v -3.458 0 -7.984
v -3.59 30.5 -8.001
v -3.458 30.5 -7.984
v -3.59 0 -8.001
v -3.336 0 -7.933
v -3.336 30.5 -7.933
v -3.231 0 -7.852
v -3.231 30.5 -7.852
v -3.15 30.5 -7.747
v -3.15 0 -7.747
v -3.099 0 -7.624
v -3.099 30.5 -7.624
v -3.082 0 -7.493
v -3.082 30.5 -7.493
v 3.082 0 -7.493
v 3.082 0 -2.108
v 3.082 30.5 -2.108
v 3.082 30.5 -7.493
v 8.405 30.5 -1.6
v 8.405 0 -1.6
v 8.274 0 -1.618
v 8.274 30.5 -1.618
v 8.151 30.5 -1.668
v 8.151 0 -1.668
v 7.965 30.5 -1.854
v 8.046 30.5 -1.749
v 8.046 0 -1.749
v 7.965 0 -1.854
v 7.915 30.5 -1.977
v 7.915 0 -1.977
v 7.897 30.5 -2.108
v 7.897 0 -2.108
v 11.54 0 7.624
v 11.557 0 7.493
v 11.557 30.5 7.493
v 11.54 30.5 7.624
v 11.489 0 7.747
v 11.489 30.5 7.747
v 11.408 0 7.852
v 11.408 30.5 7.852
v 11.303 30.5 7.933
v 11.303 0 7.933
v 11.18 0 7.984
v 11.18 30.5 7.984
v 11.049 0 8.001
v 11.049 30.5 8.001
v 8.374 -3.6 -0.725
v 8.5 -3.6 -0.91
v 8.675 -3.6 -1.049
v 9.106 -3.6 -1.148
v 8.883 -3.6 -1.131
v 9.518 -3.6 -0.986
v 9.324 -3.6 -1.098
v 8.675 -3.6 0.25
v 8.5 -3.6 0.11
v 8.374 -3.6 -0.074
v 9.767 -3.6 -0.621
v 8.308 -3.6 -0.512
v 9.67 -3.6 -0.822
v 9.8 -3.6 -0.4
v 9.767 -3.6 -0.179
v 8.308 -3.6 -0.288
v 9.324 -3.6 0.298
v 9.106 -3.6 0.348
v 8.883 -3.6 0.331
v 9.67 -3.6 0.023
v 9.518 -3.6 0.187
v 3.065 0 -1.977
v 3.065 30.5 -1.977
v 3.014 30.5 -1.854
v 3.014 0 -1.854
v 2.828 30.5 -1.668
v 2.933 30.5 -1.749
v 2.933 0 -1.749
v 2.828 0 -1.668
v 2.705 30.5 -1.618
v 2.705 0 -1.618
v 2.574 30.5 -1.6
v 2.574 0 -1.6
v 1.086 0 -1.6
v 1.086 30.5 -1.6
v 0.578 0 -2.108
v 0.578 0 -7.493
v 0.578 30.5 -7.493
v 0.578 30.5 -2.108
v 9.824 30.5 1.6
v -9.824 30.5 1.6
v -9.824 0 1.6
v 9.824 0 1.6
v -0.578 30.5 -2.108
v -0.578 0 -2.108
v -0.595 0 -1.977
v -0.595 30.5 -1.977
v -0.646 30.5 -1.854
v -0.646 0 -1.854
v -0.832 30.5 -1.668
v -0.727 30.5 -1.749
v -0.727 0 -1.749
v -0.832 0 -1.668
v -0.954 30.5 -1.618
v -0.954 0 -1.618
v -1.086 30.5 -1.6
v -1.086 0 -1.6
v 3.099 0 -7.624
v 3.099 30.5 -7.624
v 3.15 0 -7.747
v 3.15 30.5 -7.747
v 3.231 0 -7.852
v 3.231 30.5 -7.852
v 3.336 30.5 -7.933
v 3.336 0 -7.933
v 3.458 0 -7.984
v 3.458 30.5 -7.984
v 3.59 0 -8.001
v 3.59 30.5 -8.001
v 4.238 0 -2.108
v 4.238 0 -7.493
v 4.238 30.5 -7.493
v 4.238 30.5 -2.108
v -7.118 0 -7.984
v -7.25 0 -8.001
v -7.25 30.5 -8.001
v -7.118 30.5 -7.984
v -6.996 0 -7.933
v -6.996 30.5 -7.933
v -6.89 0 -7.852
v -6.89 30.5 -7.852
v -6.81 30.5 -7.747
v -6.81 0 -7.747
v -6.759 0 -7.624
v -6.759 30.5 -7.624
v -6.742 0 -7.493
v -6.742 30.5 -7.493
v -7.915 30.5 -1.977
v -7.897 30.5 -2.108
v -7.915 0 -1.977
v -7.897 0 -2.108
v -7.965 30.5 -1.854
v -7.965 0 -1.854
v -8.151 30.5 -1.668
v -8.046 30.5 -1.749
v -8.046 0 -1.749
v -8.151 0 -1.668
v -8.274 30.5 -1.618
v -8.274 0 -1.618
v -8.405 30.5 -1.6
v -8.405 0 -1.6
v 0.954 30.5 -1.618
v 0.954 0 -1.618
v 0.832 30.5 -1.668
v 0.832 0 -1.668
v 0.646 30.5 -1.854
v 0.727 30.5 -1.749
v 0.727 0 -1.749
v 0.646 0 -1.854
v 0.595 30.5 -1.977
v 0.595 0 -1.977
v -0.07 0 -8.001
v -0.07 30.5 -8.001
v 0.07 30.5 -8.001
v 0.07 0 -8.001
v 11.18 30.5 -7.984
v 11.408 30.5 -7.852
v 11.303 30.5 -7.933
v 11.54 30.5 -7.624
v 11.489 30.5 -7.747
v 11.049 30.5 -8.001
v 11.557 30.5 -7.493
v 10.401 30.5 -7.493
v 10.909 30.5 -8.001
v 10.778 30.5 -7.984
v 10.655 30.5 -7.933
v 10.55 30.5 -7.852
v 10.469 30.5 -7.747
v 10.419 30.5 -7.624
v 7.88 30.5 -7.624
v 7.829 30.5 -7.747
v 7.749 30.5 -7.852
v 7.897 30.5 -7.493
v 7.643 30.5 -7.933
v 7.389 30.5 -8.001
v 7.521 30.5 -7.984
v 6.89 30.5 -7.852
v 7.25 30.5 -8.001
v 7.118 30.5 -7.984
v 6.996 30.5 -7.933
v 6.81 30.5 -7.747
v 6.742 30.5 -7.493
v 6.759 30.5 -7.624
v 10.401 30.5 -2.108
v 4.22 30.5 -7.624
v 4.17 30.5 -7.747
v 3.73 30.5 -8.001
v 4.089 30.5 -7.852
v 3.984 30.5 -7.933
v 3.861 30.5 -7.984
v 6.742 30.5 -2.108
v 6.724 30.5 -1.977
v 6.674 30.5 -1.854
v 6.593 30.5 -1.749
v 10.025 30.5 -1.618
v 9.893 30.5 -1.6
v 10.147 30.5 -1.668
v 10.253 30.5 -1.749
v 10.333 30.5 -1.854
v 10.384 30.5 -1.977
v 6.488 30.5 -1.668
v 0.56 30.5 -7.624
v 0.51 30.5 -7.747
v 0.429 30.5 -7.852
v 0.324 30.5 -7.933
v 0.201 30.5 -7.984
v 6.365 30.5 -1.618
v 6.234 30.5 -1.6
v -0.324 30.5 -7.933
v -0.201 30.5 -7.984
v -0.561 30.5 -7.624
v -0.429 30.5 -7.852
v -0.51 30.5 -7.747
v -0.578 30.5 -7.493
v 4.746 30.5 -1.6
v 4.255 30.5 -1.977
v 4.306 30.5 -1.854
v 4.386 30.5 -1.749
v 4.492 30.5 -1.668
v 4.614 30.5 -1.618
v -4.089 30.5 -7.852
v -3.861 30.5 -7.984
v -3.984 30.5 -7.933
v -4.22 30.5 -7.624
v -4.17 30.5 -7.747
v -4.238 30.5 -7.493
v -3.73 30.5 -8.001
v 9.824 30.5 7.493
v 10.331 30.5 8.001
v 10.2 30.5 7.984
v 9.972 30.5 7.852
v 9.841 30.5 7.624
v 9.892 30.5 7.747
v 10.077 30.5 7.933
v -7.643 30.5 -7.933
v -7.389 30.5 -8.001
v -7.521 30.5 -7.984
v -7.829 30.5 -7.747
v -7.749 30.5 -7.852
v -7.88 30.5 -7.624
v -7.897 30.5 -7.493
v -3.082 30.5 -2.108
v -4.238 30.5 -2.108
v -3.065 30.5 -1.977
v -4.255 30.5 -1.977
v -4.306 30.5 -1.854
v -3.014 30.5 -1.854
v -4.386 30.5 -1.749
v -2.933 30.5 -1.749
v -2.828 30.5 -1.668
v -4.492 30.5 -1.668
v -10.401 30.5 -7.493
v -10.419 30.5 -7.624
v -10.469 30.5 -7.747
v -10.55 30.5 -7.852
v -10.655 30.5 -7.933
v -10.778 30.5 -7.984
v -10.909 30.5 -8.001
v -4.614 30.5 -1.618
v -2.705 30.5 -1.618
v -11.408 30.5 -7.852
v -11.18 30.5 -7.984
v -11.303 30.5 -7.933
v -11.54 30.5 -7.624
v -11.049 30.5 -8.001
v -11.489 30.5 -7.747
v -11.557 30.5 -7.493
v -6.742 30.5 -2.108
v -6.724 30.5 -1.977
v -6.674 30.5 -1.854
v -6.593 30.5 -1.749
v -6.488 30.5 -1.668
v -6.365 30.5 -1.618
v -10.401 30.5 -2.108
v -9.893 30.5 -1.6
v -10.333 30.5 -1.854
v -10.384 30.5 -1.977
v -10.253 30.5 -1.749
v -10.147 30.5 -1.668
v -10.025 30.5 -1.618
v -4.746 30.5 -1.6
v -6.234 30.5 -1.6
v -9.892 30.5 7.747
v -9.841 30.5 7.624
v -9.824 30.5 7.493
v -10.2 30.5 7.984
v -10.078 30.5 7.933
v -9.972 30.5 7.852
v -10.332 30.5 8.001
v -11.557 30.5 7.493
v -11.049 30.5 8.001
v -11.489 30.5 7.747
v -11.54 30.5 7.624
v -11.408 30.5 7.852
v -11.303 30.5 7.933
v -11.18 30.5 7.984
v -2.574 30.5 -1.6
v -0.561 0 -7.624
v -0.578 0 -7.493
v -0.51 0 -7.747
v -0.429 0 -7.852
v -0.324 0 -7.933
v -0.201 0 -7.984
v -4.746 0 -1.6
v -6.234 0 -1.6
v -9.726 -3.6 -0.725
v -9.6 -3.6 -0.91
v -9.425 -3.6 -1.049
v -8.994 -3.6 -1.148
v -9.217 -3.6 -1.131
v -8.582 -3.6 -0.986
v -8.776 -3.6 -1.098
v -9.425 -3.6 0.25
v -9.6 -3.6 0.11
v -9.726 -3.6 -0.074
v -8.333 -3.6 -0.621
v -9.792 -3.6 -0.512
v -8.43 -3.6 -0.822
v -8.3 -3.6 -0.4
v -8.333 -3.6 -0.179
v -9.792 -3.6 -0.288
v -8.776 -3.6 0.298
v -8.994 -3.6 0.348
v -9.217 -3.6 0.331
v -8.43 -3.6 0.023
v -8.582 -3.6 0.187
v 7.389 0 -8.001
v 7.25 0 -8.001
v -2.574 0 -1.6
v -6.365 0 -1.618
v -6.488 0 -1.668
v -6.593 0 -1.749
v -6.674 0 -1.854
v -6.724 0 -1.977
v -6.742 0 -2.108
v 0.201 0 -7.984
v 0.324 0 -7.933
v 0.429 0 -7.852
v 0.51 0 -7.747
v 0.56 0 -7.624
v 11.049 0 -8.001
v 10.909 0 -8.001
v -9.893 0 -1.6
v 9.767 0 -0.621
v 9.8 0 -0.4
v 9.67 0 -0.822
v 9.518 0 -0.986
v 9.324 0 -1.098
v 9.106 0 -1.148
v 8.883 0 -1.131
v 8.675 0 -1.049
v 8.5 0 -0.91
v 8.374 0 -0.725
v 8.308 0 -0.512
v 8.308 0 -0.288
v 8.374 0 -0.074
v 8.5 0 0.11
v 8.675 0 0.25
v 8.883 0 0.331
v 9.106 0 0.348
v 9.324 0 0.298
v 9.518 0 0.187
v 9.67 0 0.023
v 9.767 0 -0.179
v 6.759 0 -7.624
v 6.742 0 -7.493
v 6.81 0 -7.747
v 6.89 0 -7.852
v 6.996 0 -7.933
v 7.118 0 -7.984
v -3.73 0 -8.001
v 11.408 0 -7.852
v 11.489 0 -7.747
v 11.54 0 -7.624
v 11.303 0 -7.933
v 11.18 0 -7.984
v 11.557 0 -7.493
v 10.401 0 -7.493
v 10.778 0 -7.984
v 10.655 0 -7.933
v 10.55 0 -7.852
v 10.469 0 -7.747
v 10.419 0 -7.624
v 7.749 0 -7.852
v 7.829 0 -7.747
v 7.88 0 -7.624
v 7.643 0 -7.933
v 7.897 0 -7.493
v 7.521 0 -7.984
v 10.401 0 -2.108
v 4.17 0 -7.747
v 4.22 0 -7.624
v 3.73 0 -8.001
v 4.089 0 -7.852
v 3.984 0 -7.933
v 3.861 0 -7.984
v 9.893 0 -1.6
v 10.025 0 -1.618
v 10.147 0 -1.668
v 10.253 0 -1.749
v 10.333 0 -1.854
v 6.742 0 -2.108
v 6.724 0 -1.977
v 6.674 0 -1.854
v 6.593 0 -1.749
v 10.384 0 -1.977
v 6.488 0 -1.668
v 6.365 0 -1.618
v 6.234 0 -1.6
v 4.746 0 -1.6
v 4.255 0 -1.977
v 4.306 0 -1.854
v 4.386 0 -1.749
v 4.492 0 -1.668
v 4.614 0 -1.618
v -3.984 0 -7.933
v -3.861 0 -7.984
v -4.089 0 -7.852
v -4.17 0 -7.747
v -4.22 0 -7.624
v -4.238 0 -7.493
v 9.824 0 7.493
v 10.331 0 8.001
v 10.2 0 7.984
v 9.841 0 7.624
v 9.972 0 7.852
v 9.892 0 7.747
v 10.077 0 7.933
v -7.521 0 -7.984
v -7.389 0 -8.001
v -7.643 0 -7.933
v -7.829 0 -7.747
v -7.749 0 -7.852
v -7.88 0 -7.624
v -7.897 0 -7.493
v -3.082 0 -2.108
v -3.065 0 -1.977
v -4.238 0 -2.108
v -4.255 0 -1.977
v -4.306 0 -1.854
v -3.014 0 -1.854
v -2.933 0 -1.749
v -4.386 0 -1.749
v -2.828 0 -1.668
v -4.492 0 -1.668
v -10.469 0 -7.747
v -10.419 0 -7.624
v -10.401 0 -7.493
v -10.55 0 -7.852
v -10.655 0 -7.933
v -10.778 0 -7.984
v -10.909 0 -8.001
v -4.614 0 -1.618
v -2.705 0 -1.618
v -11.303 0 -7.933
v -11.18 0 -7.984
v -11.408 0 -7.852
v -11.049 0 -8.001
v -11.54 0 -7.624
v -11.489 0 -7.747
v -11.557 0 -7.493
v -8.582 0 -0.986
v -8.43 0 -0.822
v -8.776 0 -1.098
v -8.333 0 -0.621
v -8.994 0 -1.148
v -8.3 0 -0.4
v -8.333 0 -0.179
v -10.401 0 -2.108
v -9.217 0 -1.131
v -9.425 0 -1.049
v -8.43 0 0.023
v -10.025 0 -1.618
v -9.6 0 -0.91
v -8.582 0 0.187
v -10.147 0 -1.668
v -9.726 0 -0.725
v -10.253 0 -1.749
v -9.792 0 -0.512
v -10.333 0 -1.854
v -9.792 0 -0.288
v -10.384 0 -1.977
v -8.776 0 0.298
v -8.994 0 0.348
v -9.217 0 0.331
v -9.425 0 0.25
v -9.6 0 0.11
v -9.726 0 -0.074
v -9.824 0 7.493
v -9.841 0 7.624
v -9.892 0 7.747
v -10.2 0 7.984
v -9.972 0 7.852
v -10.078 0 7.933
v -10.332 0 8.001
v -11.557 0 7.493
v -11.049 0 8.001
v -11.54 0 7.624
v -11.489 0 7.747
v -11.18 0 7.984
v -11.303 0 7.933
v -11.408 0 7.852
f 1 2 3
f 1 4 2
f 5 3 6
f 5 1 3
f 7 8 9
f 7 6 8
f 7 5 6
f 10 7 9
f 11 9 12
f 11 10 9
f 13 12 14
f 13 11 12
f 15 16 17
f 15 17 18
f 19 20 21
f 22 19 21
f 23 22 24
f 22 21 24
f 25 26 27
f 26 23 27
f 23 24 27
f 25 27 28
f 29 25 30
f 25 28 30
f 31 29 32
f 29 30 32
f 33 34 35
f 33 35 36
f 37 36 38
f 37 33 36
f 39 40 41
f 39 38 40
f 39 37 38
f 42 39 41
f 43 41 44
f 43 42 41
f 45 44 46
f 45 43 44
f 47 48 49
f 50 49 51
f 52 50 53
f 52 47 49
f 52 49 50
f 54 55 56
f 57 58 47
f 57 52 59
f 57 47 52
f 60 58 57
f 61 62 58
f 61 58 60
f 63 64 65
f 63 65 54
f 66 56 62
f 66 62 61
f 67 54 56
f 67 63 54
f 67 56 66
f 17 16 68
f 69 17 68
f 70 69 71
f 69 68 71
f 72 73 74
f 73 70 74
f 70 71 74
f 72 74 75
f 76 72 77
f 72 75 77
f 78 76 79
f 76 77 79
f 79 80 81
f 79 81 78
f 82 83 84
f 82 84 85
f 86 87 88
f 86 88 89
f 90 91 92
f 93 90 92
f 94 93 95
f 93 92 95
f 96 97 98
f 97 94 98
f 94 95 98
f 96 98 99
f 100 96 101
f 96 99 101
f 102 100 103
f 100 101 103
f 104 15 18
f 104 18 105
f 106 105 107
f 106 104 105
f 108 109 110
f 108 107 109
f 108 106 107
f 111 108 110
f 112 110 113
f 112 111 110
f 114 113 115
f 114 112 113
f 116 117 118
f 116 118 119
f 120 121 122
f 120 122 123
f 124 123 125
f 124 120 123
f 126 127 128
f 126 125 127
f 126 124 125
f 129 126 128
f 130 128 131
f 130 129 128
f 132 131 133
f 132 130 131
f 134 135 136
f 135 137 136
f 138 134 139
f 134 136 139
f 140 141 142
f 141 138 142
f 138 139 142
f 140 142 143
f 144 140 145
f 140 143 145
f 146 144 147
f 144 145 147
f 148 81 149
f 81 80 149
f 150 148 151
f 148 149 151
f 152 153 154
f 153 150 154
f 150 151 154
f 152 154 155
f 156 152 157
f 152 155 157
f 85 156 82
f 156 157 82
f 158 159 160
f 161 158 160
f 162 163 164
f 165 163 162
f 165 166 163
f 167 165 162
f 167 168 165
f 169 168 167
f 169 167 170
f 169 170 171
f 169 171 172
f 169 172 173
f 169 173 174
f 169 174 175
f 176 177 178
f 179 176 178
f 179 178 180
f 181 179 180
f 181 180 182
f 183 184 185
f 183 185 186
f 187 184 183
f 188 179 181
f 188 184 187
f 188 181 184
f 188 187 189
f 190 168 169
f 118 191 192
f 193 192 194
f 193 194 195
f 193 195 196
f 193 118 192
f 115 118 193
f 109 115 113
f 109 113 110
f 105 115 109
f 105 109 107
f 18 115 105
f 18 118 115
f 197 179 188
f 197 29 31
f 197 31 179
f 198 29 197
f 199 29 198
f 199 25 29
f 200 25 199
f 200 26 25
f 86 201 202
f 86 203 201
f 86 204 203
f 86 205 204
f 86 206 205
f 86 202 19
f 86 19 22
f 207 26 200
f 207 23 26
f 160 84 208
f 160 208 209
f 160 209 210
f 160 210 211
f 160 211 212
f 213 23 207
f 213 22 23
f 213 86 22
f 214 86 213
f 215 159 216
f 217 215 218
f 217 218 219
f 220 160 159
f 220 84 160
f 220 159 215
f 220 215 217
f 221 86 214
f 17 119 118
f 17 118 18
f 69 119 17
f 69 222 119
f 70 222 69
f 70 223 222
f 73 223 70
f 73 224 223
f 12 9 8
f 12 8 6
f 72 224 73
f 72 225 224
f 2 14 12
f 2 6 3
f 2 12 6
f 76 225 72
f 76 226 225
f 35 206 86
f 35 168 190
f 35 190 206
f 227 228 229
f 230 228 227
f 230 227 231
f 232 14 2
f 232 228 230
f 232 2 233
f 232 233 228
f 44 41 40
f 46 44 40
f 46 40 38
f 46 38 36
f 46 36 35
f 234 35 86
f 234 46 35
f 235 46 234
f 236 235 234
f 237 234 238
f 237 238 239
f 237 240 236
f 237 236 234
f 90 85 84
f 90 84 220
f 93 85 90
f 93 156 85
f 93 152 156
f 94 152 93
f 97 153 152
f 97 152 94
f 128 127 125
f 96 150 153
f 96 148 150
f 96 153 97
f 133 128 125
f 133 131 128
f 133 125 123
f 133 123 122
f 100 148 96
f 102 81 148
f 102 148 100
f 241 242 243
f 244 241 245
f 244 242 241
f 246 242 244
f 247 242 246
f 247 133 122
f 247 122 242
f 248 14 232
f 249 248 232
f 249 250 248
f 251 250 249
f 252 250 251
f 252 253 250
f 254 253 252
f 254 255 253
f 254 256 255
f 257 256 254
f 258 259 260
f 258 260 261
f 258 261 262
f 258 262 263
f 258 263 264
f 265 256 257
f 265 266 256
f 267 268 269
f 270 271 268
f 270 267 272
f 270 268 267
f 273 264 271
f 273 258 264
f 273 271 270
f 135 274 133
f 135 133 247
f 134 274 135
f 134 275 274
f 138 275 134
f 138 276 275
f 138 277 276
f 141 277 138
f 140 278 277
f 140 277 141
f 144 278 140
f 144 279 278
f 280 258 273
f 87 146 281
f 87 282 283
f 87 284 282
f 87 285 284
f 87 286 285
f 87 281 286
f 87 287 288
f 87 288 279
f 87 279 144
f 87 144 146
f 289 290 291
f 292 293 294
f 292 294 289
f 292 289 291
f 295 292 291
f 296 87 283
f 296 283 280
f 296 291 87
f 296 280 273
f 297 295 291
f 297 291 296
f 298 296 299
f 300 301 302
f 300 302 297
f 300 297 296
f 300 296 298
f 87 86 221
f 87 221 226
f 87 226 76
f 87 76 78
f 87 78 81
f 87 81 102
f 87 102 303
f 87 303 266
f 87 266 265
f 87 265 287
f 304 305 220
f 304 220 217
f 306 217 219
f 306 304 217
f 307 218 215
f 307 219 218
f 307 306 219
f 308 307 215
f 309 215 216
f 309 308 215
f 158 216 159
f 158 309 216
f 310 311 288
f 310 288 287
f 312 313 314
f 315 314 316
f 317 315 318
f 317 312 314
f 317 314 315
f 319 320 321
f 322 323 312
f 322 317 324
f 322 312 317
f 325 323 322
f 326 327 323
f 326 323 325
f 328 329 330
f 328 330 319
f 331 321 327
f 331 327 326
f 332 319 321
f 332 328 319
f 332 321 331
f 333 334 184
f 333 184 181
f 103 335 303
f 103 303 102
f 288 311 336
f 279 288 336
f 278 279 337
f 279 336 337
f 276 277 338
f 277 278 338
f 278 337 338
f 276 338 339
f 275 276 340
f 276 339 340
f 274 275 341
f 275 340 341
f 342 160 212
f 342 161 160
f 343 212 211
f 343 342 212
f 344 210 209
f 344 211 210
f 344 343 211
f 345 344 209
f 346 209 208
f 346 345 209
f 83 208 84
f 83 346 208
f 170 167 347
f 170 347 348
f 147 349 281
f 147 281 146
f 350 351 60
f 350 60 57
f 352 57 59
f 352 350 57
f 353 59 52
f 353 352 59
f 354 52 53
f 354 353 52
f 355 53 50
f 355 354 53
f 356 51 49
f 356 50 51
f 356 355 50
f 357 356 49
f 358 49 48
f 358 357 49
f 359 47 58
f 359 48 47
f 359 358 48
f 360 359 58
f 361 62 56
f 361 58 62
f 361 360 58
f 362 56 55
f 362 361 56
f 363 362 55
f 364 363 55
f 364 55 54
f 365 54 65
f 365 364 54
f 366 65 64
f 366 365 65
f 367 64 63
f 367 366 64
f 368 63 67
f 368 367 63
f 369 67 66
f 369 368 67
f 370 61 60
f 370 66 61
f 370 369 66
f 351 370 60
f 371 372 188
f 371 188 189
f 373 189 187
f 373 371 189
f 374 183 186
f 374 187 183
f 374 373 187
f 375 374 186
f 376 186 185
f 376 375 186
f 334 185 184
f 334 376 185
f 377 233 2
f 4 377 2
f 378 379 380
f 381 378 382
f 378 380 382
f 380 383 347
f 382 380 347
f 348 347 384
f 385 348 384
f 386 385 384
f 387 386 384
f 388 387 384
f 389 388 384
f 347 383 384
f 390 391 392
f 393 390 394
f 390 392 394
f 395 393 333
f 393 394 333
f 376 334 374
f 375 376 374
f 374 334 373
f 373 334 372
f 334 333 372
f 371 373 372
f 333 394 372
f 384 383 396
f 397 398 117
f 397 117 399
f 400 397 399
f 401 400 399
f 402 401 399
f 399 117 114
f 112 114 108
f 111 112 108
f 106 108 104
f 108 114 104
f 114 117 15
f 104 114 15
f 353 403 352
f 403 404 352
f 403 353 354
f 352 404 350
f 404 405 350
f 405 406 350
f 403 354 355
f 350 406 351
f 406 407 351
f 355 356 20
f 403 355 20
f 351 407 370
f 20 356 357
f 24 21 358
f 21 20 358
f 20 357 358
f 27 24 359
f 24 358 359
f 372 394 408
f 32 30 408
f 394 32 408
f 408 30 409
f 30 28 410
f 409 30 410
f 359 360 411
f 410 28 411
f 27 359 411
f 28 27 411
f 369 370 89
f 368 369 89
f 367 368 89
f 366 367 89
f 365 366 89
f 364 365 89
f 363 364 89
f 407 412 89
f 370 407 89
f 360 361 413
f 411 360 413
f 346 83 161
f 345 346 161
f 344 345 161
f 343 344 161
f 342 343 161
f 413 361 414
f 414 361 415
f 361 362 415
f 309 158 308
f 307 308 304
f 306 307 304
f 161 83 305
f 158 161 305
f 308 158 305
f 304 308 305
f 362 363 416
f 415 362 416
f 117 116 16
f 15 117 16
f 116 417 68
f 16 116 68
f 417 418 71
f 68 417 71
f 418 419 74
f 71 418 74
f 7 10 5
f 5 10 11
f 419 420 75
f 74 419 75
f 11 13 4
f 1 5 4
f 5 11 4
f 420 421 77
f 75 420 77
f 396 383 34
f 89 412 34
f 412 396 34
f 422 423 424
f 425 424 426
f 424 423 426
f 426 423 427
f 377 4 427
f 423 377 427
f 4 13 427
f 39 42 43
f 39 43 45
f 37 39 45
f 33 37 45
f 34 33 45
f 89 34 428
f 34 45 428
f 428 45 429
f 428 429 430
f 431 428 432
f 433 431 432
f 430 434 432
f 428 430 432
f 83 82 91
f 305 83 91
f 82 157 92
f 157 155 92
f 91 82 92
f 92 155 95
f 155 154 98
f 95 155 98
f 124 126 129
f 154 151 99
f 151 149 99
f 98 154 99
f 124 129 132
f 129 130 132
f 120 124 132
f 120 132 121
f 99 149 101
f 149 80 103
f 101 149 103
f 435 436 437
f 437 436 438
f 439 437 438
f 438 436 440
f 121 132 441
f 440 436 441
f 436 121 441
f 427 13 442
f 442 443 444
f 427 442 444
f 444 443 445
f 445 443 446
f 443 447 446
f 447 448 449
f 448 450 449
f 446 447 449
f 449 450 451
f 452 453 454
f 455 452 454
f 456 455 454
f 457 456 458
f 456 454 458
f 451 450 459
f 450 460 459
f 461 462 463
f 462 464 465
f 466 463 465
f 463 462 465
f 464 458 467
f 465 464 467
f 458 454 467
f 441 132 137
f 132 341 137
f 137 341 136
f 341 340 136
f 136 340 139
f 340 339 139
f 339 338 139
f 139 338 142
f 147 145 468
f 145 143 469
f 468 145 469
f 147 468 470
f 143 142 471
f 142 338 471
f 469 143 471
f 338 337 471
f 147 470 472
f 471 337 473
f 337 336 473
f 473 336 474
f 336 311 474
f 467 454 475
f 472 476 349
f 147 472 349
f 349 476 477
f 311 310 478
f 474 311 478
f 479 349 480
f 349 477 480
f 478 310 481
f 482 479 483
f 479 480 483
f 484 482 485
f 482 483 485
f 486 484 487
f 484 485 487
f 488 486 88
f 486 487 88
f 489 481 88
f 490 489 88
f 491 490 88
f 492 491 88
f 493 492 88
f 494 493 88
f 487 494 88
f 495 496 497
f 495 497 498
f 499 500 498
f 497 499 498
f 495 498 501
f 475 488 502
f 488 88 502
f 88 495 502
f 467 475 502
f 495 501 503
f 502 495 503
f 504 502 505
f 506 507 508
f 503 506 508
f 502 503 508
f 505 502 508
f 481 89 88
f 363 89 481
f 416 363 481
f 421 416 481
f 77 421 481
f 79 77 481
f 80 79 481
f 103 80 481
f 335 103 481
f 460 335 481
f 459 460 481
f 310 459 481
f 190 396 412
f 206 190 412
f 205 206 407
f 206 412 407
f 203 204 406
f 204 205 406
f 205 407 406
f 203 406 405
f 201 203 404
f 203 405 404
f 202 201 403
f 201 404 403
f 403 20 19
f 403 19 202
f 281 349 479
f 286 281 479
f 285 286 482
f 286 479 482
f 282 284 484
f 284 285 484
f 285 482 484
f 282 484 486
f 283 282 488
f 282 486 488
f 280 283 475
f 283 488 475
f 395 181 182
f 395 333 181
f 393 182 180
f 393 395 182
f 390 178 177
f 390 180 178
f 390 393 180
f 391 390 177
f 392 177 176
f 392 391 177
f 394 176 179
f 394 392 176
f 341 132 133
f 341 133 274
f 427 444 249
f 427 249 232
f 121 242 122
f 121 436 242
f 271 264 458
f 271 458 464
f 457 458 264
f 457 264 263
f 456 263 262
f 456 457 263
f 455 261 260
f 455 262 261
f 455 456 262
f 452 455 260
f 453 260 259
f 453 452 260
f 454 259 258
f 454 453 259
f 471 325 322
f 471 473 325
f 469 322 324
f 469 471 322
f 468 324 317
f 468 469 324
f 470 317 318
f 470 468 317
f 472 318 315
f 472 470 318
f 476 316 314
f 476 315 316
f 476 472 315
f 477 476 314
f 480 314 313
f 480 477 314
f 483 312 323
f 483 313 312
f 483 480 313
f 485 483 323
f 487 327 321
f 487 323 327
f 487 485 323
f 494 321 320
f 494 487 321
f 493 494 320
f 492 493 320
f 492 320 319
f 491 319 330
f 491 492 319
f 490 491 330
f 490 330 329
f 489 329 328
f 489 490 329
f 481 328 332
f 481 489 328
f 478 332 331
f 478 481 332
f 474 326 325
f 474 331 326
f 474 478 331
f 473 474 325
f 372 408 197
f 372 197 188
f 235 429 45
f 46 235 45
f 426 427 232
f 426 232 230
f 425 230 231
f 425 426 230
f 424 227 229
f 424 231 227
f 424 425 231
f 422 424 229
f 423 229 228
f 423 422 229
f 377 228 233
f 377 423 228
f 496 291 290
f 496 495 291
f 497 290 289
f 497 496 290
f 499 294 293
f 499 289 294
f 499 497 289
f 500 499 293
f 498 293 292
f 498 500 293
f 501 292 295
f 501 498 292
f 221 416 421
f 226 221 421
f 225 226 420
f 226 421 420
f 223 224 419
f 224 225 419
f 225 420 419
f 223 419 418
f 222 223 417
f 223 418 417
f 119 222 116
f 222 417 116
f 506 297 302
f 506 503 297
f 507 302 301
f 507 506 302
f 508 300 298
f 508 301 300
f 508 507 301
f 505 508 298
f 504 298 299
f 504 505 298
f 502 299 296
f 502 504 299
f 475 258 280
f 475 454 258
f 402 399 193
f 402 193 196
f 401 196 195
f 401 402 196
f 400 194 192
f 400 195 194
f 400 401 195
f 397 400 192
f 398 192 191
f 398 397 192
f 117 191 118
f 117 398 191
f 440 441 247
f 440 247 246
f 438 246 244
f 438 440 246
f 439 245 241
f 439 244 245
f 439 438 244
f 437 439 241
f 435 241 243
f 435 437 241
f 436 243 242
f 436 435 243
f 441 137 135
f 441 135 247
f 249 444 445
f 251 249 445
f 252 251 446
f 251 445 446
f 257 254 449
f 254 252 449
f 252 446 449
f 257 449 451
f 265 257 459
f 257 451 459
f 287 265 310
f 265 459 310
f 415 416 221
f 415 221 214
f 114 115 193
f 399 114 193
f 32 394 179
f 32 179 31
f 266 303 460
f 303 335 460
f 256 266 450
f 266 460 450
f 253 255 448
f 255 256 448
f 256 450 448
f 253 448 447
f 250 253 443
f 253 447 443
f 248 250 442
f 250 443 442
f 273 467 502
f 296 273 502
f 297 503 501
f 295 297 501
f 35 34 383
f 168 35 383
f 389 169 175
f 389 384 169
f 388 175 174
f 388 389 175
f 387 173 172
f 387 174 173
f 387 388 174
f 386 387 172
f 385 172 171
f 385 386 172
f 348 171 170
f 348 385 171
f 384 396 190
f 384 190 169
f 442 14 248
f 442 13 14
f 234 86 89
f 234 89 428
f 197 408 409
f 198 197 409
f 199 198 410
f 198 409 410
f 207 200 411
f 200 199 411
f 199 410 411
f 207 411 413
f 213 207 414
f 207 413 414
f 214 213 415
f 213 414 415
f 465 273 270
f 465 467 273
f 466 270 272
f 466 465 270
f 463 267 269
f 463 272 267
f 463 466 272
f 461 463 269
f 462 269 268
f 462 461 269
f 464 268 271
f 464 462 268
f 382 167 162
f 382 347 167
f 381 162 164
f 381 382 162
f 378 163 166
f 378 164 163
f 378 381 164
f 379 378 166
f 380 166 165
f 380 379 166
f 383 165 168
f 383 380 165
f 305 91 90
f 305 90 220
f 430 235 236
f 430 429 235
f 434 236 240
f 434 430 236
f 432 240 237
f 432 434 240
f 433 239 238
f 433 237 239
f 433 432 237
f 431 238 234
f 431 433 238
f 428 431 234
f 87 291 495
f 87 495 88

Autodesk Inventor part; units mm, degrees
ref_plane "YZ Plane" through (0, 0, 0) normal (1, 0, 0) x (0, 1, 0)
ref_plane "XZ Plane" through (0, 0, 0) normal (0, 1, 0) x (-1, 0, 0)
ref_plane "Work Plane1" through (-9.8235, 15.24, 1.6002) normal (0, 1, 0) x (1, 0, 0)
sketch "Sketch1" plane through (-9.8235, 15.24, 1.6002) normal (0, 1, 0) x (1, 0, 0)
  line L0 (-1.2255, -6.4008) -> (-0.508, -6.4008)
  arc A0 (-1.7335, -5.8928) -> (-1.2255, -6.4008) centre (-1.2255, -5.8928) ccw
  line L1 (-1.7335, 9.0932) -> (-1.7335, -5.8928)
  arc A1 (-0.508, -6.4008) -> (0, -5.8928) centre (-0.508, -5.8928) ccw
  line L2 (0, -5.8928) -> (0, 0)
  line L3 (-1.0858, 9.6012) -> (-1.2256, 9.6012)
  arc A2 (-0.5778, 9.0932) -> (-1.0858, 9.6012) centre (-1.0858, 9.0932) ccw
  line L4 (0, 0) -> (19.6469, 0)
  line L5 (19.6469, 0) -> (19.6469, -5.8928)
  arc A3 (19.6469, -5.8928) -> (20.1549, -6.4008) centre (20.1549, -5.8928) ccw
  line L6 (20.1549, -6.4008) -> (20.8725, -6.4008)
  arc A4 (20.8725, -6.4008) -> (21.3804, -5.8928) centre (20.8725, -5.8928) ccw
  line L7 (21.3804, -5.8928) -> (21.3804, 9.0932)
  arc A5 (21.3804, 9.0932) -> (20.8725, 9.6012) centre (20.8725, 9.0932) ccw
  arc A6 (20.7327, 9.6012) -> (20.2247, 9.0932) centre (20.7327, 9.0932) ccw
  line L8 (20.8725, 9.6012) -> (20.7327, 9.6012)
  line L9 (-0.5778, 9.0932) -> (-0.5778, 3.7084)
  arc A7 (-0.5778, 3.7084) -> (-0.0698, 3.2004) centre (-0.0698, 3.7084) ccw
  line L10 (-0.0698, 3.2004) -> (1.4182, 3.2004)
  arc A8 (1.4182, 3.2004) -> (1.9262, 3.7084) centre (1.4182, 3.7084) ccw
  line L11 (1.9262, 3.7084) -> (1.9262, 9.0932)
  arc A9 (-0.5778, 9.0932) -> (-1.0858, 9.6012) centre (-1.0859, 9.0932) ccw
  arc A10 (-1.2256, 9.6012) -> (-1.7335, 9.0932) centre (-1.2256, 9.0932) ccw
  line L12 (-1.2256, 9.6012) -> (-1.0858, 9.6012)
  arc A11 (2.4342, 9.6012) -> (1.9262, 9.0932) centre (2.4342, 9.0932) ccw
  line L13 (2.4342, 9.6012) -> (2.5739, 9.6012)
  arc A12 (3.0819, 9.0932) -> (2.5739, 9.6012) centre (2.5739, 9.0932) ccw
  line L14 (3.0819, 9.0932) -> (3.0819, 3.7084)
  arc A13 (3.0819, 3.7084) -> (3.5899, 3.2004) centre (3.5899, 3.7084) ccw
  line L15 (3.5899, 3.2004) -> (5.0779, 3.2004)
  arc A14 (5.0779, 3.2004) -> (5.5859, 3.7084) centre (5.0779, 3.7084) ccw
  line L16 (5.5859, 3.7084) -> (5.5859, 9.0932)
  arc A15 (6.0939, 9.6012) -> (5.5859, 9.0932) centre (6.0939, 9.0932) ccw
  line L17 (6.0939, 9.6012) -> (6.2336, 9.6012)
  arc A16 (6.7416, 9.0932) -> (6.2336, 9.6012) centre (6.2336, 9.0932) ccw
  line L18 (6.7416, 9.0932) -> (6.7416, 3.7084)
  arc A17 (6.7416, 3.7084) -> (7.2496, 3.2004) centre (7.2496, 3.7084) ccw
  line L19 (7.2496, 3.2004) -> (8.7376, 3.2004)
  arc A18 (8.7376, 3.2004) -> (9.2456, 3.7084) centre (8.7376, 3.7084) ccw
  line L20 (9.2456, 3.7084) -> (9.2456, 9.0932)
  arc A19 (9.7536, 9.6012) -> (9.2456, 9.0932) centre (9.7536, 9.0932) ccw
  line L21 (9.7536, 9.6012) -> (9.8933, 9.6012)
  arc A20 (10.4013, 9.0932) -> (9.8933, 9.6012) centre (9.8933, 9.0932) ccw
  line L22 (10.4013, 9.0932) -> (10.4013, 3.7084)
  arc A21 (10.4013, 3.7084) -> (10.9093, 3.2004) centre (10.9093, 3.7084) ccw
  line L23 (10.9093, 3.2004) -> (12.3973, 3.2004)
  arc A22 (12.3973, 3.2004) -> (12.9053, 3.7084) centre (12.3973, 3.7084) ccw
  line L24 (12.9053, 3.7084) -> (12.9053, 9.0932)
  arc A23 (13.4133, 9.6012) -> (12.9053, 9.0932) centre (13.4133, 9.0932) ccw
  line L25 (13.4133, 9.6012) -> (13.553, 9.6012)
  arc A24 (14.061, 9.0932) -> (13.553, 9.6012) centre (13.553, 9.0932) ccw
  line L26 (14.061, 9.0932) -> (14.061, 3.7084)
  arc A25 (14.061, 3.7084) -> (14.569, 3.2004) centre (14.569, 3.7084) ccw
  line L27 (14.569, 3.2004) -> (16.057, 3.2004)
  arc A26 (16.057, 3.2004) -> (16.565, 3.7084) centre (16.057, 3.7084) ccw
  line L28 (16.565, 3.7084) -> (16.565, 9.0932)
  arc A27 (17.073, 9.6012) -> (16.565, 9.0932) centre (17.073, 9.0932) ccw
  line L29 (17.073, 9.6012) -> (17.2127, 9.6012)
  arc A28 (17.7207, 9.0932) -> (17.2127, 9.6012) centre (17.2127, 9.0932) ccw
  line L30 (17.7207, 9.0932) -> (17.7207, 3.7084)
  arc A29 (17.7207, 3.7084) -> (18.2287, 3.2004) centre (18.2287, 3.7084) ccw
  line L31 (18.2287, 3.2004) -> (19.7167, 3.2004)
  arc A30 (19.7167, 3.2004) -> (20.2247, 3.7084) centre (19.7167, 3.7084) ccw
  line L32 (20.2247, 3.7084) -> (20.2247, 9.0932)
  dimension "d0" = 21.9583
  dimension "d1" = 3.6597
sketch "Sketch2" plane through (0, 0, 0) normal (0, 1, 0) x (-1, 0, 0)
  line L0 (-9.8235, 1.6002) -> (-9.8235, 7.493) projected
  arc A0 (-9.8235, 7.493) -> (-10.3314, 8.001) centre (-10.3314, 7.493) ccw projected
  line L1 (-10.3314, 8.001) -> (-11.049, 8.001) projected
  arc A1 (-11.049, 8.001) -> (-11.557, 7.493) centre (-11.049, 7.493) ccw projected
  line L2 (-11.557, 7.493) -> (-11.557, -7.493) projected
  arc A2 (-11.557, -7.493) -> (-11.049, -8.001) centre (-11.049, -7.493) ccw projected
  arc A3 (-10.9093, -8.001) -> (-10.4013, -7.493) centre (-10.9093, -7.493) ccw projected
  line L3 (-10.4013, -2.1082) -> (-10.4013, -7.493) projected
  arc A4 (-9.8933, -1.6002) -> (-10.4013, -2.1082) centre (-9.8933, -2.1082) ccw projected
  line L4 (-8.4053, -1.6002) -> (-9.8933, -1.6002) projected
  line L5 (-11.049, -8.001) -> (-10.9093, -8.001) projected
  arc A5 (-7.8973, -2.1082) -> (-8.4053, -1.6002) centre (-8.4053, -2.1082) ccw projected
  line L6 (-7.8973, -7.493) -> (-7.8973, -2.1082) projected
  arc A6 (-7.8973, -7.493) -> (-7.3893, -8.001) centre (-7.3893, -7.493) ccw projected
  line L7 (-7.2496, -8.001) -> (-7.3893, -8.001) projected
  arc A7 (-7.2496, -8.001) -> (-6.7416, -7.493) centre (-7.2496, -7.493) ccw projected
  line L8 (-6.7416, -2.1082) -> (-6.7416, -7.493) projected
  arc A8 (-6.2336, -1.6002) -> (-6.7416, -2.1082) centre (-6.2336, -2.1082) ccw projected
  line L9 (-4.7456, -1.6002) -> (-6.2336, -1.6002) projected
  arc A9 (-4.2376, -2.1082) -> (-4.7456, -1.6002) centre (-4.7456, -2.1082) ccw projected
  line L10 (-4.2376, -7.493) -> (-4.2376, -2.1082) projected
  arc A10 (-4.2376, -7.493) -> (-3.7296, -8.001) centre (-3.7296, -7.493) ccw projected
  line L11 (-3.5899, -8.001) -> (-3.7296, -8.001) projected
  arc A11 (-3.5899, -8.001) -> (-3.0819, -7.493) centre (-3.5899, -7.493) ccw projected
  line L12 (-3.0819, -2.1082) -> (-3.0819, -7.493) projected
  arc A12 (-2.5739, -1.6002) -> (-3.0819, -2.1082) centre (-2.5739, -2.1082) ccw projected
  line L13 (-1.0858, -1.6002) -> (-2.5739, -1.6002) projected
  arc A13 (-0.5778, -2.1082) -> (-1.0858, -1.6002) centre (-1.0858, -2.1082) ccw projected
  line L14 (-0.5778, -7.493) -> (-0.5778, -2.1082) projected
  arc A14 (-0.5778, -7.493) -> (-0.0698, -8.001) centre (-0.0698, -7.493) ccw projected
  line L15 (0.0699, -8.001) -> (-0.0698, -8.001) projected
  arc A15 (0.0699, -8.001) -> (0.5779, -7.493) centre (0.0699, -7.493) ccw projected
  line L16 (0.5779, -2.1082) -> (0.5779, -7.493) projected
  arc A16 (1.0859, -1.6002) -> (0.5779, -2.1082) centre (1.0859, -2.1082) ccw projected
  line L17 (2.5739, -1.6002) -> (1.0859, -1.6002) projected
  arc A17 (3.0819, -2.1082) -> (2.5739, -1.6002) centre (2.5739, -2.1082) ccw projected
  line L18 (3.0819, -7.493) -> (3.0819, -2.1082) projected
  arc A18 (3.0819, -7.493) -> (3.5899, -8.001) centre (3.5899, -7.493) ccw projected
  line L19 (3.7296, -8.001) -> (3.5899, -8.001) projected
  arc A19 (3.7296, -8.001) -> (4.2376, -7.493) centre (3.7296, -7.493) ccw projected
  line L20 (4.2376, -2.1082) -> (4.2376, -7.493) projected
  arc A20 (4.7456, -1.6002) -> (4.2376, -2.1082) centre (4.7456, -2.1082) ccw projected
  line L21 (6.2336, -1.6002) -> (4.7456, -1.6002) projected
  arc A21 (6.7416, -2.1082) -> (6.2336, -1.6002) centre (6.2336, -2.1082) ccw projected
  line L22 (6.7416, -7.493) -> (6.7416, -2.1082) projected
  arc A22 (6.7416, -7.493) -> (7.2496, -8.001) centre (7.2496, -7.493) ccw projected
  line L23 (7.3893, -8.001) -> (7.2496, -8.001) projected
  arc A23 (7.3893, -8.001) -> (7.8973, -7.493) centre (7.3893, -7.493) ccw projected
  line L24 (7.8973, -2.1082) -> (7.8973, -7.493) projected
  arc A24 (8.4053, -1.6002) -> (7.8973, -2.1082) centre (8.4053, -2.1082) ccw projected
  line L25 (9.8933, -1.6002) -> (8.4053, -1.6002) projected
  arc A25 (10.4013, -2.1082) -> (9.8933, -1.6002) centre (9.8933, -2.1082) ccw projected
  line L26 (10.4013, -7.493) -> (10.4013, -2.1082) projected
  arc A26 (10.4013, -7.493) -> (10.9093, -8.001) centre (10.9093, -7.493) ccw projected
  line L27 (10.9093, -8.001) -> (11.049, -8.001) projected
  arc A27 (11.049, -8.001) -> (11.557, -7.493) centre (11.049, -7.493) ccw projected
  line L28 (11.557, -7.493) -> (11.557, 7.493) projected
  arc A28 (11.557, 7.493) -> (11.049, 8.001) centre (11.049, 7.493) ccw projected
  line L29 (11.049, 8.001) -> (10.3315, 8.001) projected
  arc A29 (10.3315, 8.001) -> (9.8235, 7.493) centre (10.3315, 7.493) ccw projected
  line L30 (9.8235, 7.493) -> (9.8235, 1.6002) projected
  line L31 (9.8235, 1.6002) -> (-9.8235, 1.6002) projected
  point P0 (0, 0)
extrude "Extrusion1" add sketch "Sketch2" along normal blind 30.5
sketch "Sketch3" plane through (0, 0, 0) normal (0, -1, 0) x (1, 0, 0)
  line L0 (-9.8235, 1.6002) -> (9.8235, 1.6002) construction
  circle A0 centre (9.05, -0.3998) radius 0.75
  circle A1 centre (-9.05, -0.3998) radius 0.75
  line L1 (9.05, -0.3998) -> (0, 0) construction
  line L2 (0, 0) -> (-9.05, -0.3998) construction
  dimension "d11" = 1.5
  dimension "d12" = 2
  dimension "d13" = 18.1
extrude "Extrusion2" add sketch "Sketch3" along normal blind 3.6
equation "\"d1\" = 0.166667 * d0"
properties part number "WA-T247-101E"
